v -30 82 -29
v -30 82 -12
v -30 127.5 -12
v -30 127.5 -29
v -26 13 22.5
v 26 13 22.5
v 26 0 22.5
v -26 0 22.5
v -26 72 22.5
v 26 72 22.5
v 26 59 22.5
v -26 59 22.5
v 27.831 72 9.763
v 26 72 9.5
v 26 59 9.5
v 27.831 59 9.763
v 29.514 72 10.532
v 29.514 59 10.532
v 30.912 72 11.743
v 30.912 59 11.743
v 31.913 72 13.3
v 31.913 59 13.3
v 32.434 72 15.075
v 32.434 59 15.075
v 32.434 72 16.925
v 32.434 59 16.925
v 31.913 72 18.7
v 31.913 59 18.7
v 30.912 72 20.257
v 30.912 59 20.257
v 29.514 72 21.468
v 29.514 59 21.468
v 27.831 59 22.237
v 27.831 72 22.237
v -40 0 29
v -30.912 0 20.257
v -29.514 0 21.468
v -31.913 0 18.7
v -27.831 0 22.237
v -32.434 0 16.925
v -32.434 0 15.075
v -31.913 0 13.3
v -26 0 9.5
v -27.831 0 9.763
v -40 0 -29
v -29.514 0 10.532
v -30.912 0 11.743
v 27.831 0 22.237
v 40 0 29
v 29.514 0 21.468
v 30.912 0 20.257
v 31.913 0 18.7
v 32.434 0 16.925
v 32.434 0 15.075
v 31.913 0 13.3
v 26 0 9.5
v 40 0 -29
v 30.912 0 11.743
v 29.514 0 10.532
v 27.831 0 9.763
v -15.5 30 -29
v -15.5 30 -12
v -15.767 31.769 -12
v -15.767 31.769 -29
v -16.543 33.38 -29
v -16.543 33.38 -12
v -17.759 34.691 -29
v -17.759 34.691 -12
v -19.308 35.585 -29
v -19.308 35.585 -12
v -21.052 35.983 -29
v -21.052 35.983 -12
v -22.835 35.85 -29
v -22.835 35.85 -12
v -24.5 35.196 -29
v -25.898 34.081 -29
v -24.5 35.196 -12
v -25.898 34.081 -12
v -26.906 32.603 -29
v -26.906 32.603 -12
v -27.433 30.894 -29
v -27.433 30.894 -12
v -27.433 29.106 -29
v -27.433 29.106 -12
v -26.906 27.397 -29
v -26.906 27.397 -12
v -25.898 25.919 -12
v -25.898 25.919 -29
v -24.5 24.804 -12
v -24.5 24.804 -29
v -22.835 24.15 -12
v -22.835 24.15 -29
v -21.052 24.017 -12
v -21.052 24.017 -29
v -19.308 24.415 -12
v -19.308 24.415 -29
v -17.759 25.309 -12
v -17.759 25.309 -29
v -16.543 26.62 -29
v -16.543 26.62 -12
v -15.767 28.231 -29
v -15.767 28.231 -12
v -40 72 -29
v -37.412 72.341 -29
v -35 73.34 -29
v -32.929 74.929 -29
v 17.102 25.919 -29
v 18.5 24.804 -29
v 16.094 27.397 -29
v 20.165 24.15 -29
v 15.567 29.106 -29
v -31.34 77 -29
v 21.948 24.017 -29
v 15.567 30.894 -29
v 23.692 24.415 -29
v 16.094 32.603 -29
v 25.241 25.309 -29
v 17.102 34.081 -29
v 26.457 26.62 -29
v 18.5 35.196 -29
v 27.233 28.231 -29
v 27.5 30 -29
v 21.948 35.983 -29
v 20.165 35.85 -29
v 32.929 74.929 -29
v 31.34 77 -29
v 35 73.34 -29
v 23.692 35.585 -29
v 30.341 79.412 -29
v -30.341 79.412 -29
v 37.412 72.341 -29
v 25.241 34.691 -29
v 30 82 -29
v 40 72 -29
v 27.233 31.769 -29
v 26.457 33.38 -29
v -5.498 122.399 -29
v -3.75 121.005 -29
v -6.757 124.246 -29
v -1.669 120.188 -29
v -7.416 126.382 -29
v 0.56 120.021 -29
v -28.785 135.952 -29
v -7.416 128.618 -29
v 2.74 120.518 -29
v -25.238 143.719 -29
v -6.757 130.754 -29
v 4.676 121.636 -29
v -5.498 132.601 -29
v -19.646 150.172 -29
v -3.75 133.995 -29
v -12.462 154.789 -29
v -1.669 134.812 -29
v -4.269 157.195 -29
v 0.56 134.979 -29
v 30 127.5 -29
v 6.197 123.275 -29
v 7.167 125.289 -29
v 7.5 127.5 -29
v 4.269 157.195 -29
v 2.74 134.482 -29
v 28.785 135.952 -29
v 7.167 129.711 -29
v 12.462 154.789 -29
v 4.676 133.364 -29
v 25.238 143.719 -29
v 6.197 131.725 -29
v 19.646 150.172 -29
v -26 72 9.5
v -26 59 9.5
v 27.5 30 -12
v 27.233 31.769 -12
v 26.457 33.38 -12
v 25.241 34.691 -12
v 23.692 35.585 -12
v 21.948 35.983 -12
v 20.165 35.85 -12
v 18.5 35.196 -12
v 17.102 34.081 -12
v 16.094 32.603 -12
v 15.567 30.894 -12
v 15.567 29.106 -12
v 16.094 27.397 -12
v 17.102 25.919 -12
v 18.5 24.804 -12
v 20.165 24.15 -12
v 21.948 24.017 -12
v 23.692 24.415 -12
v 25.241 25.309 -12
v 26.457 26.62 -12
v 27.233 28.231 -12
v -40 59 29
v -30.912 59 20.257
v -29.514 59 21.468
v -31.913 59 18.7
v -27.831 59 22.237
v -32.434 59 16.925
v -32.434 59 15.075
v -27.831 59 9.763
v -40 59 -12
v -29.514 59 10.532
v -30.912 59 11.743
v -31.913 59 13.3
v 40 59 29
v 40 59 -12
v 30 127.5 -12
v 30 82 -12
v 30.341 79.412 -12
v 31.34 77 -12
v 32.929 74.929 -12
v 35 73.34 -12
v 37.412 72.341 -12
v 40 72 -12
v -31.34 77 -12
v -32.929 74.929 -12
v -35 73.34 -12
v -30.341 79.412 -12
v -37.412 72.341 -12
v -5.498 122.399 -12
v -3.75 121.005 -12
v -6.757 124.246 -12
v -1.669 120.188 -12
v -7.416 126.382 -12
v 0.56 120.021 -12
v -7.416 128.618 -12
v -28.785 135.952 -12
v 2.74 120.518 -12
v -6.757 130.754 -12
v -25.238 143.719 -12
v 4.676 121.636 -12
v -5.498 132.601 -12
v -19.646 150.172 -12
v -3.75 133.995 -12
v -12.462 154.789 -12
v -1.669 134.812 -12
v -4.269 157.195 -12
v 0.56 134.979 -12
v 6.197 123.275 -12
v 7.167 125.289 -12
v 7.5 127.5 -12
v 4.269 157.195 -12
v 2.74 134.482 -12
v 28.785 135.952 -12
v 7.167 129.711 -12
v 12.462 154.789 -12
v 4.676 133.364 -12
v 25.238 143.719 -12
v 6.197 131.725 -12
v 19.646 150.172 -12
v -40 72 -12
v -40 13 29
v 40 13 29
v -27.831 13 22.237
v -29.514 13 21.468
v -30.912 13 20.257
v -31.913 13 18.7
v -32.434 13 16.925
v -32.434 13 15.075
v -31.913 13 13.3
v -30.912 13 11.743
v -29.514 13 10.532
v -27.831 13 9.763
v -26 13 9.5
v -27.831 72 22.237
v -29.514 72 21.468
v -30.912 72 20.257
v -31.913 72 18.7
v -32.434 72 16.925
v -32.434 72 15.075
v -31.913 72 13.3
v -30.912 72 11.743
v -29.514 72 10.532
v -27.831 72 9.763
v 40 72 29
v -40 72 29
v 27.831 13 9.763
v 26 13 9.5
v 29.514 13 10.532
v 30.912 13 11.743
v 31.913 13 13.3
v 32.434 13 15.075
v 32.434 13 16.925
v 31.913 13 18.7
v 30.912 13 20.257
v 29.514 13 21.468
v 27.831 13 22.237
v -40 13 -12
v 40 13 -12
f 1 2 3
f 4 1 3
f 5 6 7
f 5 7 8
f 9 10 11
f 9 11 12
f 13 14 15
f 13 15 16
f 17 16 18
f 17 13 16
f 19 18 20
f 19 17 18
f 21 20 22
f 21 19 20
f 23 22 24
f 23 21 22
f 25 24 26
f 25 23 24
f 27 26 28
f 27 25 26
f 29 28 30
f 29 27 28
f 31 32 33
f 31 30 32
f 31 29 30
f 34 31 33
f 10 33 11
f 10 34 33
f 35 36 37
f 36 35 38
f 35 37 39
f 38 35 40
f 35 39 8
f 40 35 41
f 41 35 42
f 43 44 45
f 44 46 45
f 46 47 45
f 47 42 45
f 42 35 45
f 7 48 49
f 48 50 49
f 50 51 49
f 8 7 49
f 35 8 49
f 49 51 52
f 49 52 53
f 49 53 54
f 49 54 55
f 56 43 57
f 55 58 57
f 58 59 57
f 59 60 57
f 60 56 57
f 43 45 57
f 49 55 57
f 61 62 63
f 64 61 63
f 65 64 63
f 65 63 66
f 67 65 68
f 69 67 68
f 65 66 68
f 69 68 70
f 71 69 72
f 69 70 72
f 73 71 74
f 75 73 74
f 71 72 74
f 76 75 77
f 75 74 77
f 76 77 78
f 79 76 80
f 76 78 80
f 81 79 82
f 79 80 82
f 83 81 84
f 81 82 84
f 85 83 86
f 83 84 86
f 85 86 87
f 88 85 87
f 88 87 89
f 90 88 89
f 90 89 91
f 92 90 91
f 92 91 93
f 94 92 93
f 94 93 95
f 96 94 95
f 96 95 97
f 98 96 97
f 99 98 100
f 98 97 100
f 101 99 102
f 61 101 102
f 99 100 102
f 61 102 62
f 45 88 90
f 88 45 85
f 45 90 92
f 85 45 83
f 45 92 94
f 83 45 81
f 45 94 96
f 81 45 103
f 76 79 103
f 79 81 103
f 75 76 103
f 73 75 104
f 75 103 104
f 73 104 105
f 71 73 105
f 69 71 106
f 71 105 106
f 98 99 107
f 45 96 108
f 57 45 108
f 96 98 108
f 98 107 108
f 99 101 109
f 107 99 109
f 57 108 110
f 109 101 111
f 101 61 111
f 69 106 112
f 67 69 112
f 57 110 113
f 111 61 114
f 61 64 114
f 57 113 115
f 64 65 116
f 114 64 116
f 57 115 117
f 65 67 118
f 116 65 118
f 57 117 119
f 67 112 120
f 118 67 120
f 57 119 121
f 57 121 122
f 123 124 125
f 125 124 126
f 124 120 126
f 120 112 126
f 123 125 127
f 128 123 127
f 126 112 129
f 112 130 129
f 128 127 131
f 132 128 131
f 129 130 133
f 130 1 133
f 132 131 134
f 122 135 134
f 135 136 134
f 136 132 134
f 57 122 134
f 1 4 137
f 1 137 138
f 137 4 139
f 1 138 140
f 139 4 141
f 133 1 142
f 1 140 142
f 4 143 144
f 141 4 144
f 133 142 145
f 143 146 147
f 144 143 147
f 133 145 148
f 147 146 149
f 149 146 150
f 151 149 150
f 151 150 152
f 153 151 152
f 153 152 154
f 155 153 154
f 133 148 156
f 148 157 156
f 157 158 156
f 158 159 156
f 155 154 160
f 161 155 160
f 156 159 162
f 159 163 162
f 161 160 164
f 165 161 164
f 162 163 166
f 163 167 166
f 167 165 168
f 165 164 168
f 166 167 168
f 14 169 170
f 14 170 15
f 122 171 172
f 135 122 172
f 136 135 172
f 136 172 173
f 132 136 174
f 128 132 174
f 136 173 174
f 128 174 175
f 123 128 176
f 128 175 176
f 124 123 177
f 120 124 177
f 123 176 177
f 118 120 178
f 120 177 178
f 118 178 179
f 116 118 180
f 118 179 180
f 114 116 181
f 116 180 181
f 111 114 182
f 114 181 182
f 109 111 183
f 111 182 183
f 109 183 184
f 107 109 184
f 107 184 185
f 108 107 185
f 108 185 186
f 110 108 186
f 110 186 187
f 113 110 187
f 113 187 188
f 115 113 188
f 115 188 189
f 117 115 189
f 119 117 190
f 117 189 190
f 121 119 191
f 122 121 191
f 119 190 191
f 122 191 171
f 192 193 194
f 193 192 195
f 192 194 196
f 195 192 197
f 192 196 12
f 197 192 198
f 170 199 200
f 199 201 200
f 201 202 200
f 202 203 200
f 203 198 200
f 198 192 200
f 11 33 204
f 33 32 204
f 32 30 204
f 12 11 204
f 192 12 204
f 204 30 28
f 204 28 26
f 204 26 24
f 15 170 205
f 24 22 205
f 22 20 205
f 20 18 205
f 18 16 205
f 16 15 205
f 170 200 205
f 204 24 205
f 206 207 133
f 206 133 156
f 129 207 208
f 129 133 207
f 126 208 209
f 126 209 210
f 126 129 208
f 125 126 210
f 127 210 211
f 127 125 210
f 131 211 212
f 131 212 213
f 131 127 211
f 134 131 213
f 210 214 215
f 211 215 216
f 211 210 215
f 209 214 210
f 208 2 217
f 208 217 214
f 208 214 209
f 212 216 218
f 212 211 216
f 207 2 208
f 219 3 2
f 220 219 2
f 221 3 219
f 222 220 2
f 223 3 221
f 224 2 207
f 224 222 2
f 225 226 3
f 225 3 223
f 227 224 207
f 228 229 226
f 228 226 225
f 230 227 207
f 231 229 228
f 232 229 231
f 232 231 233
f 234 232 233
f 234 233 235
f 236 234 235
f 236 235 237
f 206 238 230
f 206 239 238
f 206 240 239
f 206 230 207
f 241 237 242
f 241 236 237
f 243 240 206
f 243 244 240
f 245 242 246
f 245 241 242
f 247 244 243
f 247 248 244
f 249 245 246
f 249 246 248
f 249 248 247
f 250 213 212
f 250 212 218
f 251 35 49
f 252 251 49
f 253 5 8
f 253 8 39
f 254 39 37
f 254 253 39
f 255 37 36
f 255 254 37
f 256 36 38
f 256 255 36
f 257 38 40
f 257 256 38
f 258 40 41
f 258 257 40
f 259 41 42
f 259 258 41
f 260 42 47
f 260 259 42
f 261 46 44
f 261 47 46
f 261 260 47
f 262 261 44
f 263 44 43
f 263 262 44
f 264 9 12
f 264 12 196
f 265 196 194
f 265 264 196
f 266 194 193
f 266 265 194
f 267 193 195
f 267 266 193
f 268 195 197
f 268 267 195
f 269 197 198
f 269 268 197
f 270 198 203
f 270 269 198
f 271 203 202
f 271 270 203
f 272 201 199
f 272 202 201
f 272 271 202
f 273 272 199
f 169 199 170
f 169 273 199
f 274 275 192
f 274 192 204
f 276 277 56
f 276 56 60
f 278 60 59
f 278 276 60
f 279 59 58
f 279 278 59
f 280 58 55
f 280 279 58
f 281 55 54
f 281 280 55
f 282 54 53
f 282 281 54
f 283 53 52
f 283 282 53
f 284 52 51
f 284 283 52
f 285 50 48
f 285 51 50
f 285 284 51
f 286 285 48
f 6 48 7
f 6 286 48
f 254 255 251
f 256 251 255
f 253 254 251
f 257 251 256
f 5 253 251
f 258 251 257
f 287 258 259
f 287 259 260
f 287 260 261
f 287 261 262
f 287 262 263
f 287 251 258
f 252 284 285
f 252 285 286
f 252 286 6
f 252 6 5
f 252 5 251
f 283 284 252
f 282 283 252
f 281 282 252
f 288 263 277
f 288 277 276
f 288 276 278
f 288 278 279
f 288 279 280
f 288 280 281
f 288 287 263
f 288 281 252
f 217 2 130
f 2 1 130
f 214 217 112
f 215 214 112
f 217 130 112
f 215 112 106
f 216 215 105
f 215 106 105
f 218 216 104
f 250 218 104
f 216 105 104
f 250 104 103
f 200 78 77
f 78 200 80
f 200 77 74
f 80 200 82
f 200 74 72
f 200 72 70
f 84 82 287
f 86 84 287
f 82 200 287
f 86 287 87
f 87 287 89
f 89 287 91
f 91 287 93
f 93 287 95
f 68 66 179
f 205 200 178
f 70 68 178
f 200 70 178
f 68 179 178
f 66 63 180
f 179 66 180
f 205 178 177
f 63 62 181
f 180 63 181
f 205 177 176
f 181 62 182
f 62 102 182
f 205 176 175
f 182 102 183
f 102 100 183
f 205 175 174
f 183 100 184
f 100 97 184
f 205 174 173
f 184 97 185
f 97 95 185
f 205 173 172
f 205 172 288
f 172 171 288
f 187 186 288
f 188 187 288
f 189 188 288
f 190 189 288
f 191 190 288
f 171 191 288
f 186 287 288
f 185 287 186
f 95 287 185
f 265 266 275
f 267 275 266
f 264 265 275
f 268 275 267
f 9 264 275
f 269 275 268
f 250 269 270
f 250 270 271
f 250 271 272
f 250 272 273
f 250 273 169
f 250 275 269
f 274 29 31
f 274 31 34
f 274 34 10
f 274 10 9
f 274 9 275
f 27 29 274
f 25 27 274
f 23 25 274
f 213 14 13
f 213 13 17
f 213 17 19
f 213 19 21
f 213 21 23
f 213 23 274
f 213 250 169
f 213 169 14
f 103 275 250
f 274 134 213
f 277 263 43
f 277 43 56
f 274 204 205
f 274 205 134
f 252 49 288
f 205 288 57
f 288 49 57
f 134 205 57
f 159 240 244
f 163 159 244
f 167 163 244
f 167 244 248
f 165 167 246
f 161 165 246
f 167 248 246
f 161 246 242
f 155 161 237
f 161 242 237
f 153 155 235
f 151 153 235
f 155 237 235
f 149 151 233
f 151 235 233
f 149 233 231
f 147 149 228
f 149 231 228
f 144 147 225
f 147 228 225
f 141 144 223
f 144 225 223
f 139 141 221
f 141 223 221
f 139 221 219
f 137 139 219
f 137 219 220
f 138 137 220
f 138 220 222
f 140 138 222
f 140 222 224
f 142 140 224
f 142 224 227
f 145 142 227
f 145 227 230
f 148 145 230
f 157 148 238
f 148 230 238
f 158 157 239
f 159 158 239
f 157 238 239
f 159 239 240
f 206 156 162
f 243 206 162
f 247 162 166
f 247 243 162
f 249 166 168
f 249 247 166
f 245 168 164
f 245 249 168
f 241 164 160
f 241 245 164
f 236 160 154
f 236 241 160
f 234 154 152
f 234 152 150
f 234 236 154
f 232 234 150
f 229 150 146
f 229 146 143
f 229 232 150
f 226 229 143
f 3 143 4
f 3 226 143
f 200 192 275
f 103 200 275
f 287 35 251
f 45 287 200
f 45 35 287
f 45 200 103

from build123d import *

# Parameters (mm, degrees)
SKETCH1_W           = 80
SKETCH1_H           = 58
BOSS_EXTRUDE1_DEPTH = 13
SKETCH2_W           = 80
SKETCH2_H           = 17
BOSS_EXTRUDE2_DEPTH = 59
SKETCH3_W           = 80
SKETCH3_H           = 13
BOSS_EXTRUDE3_DEPTH = 41
SKETCH4_W           = 80
SKETCH4_H           = 17
BOSS_EXTRUDE4_DEPTH = 55.5
SKETCH5_W           = 10
SKETCH5_H           = 55.5
CUT_EXTRUDE1_DEPTH  = 55.5
SKETCH7_W           = 10
SKETCH7_H           = 55.5
CUT_EXTRUDE2_DEPTH  = 55.5
SKETCH8_R           = 30
BOSS_EXTRUDE5_DEPTH = 17
SKETCH9_R           = 7.5
CUT_EXTRUDE3_DEPTH  = 17
FILLET1_R           = 10
FILLET2_R           = 10
CUT_EXTRUDE4_DEPTH  = 17
CUT_EXTRUDE5_DEPTH  = 17
SKETCH12_R          = 6
CUT_EXTRUDE6_DEPTH  = 17
SKETCH13_R          = 6
CUT_EXTRUDE7_DEPTH  = 17


with BuildPart() as part:
    # Sketch1 → Boss-Extrude1 (new body)
    with BuildSketch(Plane(origin=(0, 0, 0), x_dir=(1, 0, 0), z_dir=(0, 1, 0))):
        Rectangle(SKETCH1_W, SKETCH1_H)
    extrude(amount=BOSS_EXTRUDE1_DEPTH)

    # Sketch2 → Boss-Extrude2 (add)
    with BuildSketch(Plane(origin=(0, 13, 0), x_dir=(1, 0, 0), z_dir=(0, 1, 0))):
        with Locations((0, 20.5)):
            Rectangle(SKETCH2_W, SKETCH2_H)
    extrude(amount=BOSS_EXTRUDE2_DEPTH)

    # Sketch3 → Boss-Extrude3 (add)
    with BuildSketch(Plane.XY.offset(-12)):
        with Locations((0, 65.5)):
            Rectangle(SKETCH3_W, SKETCH3_H)
    extrude(amount=BOSS_EXTRUDE3_DEPTH)

    # Sketch4 → Boss-Extrude4 (add)
    with BuildSketch(Plane(origin=(0, 72, 0), x_dir=(1, 0, 0), z_dir=(0, 1, 0))):
        with Locations((0, 20.5)):
            Rectangle(SKETCH4_W, SKETCH4_H)
    extrude(amount=BOSS_EXTRUDE4_DEPTH)

    # Sketch5 → Cut-Extrude1 (cut)
    with BuildSketch(Plane.XY.offset(-12)):
        with Locations((-35, 99.75)):
            Rectangle(SKETCH5_W, SKETCH5_H)
    extrude(amount=-CUT_EXTRUDE1_DEPTH, mode=Mode.SUBTRACT)

    # Sketch7 → Cut-Extrude2 (cut)
    with BuildSketch(Plane.XY.offset(-12)):
        with Locations((35, 99.75)):
            Rectangle(SKETCH7_W, SKETCH7_H)
    extrude(amount=-CUT_EXTRUDE2_DEPTH, mode=Mode.SUBTRACT)

    # Sketch8 → Boss-Extrude5 (add)
    with BuildSketch(Plane.XY.offset(-12)):
        with Locations((0, 127.5)):
            Circle(SKETCH8_R)
    extrude(amount=-BOSS_EXTRUDE5_DEPTH)

    # Sketch9 → Cut-Extrude3 (cut)
    with BuildSketch(Plane.XY.offset(-12)):
        with Locations((0, 127.5)):
            Circle(SKETCH9_R)
    extrude(amount=-CUT_EXTRUDE3_DEPTH, mode=Mode.SUBTRACT)

    # Fillet1
    fillet1_edges = [part.edges().sort_by_distance(p)[0] for p in [
        (-30, 72, -20.5),
    ]]
    fillet(fillet1_edges, radius=FILLET1_R - 0.0001)  # a hair under: the kernel refuses the full size

    # Fillet2
    fillet2_edges = [part.edges().sort_by_distance(p)[0] for p in [
        (30, 72, -20.5),
    ]]
    fillet(fillet2_edges, radius=FILLET2_R - 0.0001)  # a hair under: the kernel refuses the full size

    # Sketch10 → Cut-Extrude4 (cut)
    with BuildSketch(Plane(origin=(0, 13, 0), x_dir=(1, 0, 0), z_dir=(0, 1, 0))):
        with BuildLine():
            Line((-26, -9.5), (26, -9.5))
            ThreePointArc((26, -9.5), (32.5, -16), (26, -22.5))
            Line((26, -22.5), (-26, -22.5))
            ThreePointArc((-26, -22.5), (-32.5, -16), (-26, -9.5))
        make_face()
    extrude(amount=-CUT_EXTRUDE4_DEPTH, mode=Mode.SUBTRACT)

    # Sketch11 → Cut-Extrude5 (cut)
    with BuildSketch(Plane(origin=(0, 72, 0), x_dir=(1, 0, 0), z_dir=(0, 1, 0))):
        with BuildLine():
            Line((-26, -9.5), (26, -9.5))
            ThreePointArc((26, -9.5), (32.5, -16), (26, -22.5))
            Line((26, -22.5), (-26, -22.5))
            ThreePointArc((-26, -22.5), (-32.5, -16), (-26, -9.5))
        make_face()
    extrude(amount=-CUT_EXTRUDE5_DEPTH, mode=Mode.SUBTRACT)

    # Sketch12 → Cut-Extrude6 (cut)
    with BuildSketch(Plane.XY.offset(-12)):
        with Locations((-21.5, 30)):
            Circle(SKETCH12_R)
    extrude(amount=-CUT_EXTRUDE6_DEPTH, mode=Mode.SUBTRACT)

    # Sketch13 → Cut-Extrude7 (cut)
    with BuildSketch(Plane.XY.offset(-12)):
        with Locations((21.5, 30)):
            Circle(SKETCH13_R)
    extrude(amount=-CUT_EXTRUDE7_DEPTH, mode=Mode.SUBTRACT)


solid = part.part
